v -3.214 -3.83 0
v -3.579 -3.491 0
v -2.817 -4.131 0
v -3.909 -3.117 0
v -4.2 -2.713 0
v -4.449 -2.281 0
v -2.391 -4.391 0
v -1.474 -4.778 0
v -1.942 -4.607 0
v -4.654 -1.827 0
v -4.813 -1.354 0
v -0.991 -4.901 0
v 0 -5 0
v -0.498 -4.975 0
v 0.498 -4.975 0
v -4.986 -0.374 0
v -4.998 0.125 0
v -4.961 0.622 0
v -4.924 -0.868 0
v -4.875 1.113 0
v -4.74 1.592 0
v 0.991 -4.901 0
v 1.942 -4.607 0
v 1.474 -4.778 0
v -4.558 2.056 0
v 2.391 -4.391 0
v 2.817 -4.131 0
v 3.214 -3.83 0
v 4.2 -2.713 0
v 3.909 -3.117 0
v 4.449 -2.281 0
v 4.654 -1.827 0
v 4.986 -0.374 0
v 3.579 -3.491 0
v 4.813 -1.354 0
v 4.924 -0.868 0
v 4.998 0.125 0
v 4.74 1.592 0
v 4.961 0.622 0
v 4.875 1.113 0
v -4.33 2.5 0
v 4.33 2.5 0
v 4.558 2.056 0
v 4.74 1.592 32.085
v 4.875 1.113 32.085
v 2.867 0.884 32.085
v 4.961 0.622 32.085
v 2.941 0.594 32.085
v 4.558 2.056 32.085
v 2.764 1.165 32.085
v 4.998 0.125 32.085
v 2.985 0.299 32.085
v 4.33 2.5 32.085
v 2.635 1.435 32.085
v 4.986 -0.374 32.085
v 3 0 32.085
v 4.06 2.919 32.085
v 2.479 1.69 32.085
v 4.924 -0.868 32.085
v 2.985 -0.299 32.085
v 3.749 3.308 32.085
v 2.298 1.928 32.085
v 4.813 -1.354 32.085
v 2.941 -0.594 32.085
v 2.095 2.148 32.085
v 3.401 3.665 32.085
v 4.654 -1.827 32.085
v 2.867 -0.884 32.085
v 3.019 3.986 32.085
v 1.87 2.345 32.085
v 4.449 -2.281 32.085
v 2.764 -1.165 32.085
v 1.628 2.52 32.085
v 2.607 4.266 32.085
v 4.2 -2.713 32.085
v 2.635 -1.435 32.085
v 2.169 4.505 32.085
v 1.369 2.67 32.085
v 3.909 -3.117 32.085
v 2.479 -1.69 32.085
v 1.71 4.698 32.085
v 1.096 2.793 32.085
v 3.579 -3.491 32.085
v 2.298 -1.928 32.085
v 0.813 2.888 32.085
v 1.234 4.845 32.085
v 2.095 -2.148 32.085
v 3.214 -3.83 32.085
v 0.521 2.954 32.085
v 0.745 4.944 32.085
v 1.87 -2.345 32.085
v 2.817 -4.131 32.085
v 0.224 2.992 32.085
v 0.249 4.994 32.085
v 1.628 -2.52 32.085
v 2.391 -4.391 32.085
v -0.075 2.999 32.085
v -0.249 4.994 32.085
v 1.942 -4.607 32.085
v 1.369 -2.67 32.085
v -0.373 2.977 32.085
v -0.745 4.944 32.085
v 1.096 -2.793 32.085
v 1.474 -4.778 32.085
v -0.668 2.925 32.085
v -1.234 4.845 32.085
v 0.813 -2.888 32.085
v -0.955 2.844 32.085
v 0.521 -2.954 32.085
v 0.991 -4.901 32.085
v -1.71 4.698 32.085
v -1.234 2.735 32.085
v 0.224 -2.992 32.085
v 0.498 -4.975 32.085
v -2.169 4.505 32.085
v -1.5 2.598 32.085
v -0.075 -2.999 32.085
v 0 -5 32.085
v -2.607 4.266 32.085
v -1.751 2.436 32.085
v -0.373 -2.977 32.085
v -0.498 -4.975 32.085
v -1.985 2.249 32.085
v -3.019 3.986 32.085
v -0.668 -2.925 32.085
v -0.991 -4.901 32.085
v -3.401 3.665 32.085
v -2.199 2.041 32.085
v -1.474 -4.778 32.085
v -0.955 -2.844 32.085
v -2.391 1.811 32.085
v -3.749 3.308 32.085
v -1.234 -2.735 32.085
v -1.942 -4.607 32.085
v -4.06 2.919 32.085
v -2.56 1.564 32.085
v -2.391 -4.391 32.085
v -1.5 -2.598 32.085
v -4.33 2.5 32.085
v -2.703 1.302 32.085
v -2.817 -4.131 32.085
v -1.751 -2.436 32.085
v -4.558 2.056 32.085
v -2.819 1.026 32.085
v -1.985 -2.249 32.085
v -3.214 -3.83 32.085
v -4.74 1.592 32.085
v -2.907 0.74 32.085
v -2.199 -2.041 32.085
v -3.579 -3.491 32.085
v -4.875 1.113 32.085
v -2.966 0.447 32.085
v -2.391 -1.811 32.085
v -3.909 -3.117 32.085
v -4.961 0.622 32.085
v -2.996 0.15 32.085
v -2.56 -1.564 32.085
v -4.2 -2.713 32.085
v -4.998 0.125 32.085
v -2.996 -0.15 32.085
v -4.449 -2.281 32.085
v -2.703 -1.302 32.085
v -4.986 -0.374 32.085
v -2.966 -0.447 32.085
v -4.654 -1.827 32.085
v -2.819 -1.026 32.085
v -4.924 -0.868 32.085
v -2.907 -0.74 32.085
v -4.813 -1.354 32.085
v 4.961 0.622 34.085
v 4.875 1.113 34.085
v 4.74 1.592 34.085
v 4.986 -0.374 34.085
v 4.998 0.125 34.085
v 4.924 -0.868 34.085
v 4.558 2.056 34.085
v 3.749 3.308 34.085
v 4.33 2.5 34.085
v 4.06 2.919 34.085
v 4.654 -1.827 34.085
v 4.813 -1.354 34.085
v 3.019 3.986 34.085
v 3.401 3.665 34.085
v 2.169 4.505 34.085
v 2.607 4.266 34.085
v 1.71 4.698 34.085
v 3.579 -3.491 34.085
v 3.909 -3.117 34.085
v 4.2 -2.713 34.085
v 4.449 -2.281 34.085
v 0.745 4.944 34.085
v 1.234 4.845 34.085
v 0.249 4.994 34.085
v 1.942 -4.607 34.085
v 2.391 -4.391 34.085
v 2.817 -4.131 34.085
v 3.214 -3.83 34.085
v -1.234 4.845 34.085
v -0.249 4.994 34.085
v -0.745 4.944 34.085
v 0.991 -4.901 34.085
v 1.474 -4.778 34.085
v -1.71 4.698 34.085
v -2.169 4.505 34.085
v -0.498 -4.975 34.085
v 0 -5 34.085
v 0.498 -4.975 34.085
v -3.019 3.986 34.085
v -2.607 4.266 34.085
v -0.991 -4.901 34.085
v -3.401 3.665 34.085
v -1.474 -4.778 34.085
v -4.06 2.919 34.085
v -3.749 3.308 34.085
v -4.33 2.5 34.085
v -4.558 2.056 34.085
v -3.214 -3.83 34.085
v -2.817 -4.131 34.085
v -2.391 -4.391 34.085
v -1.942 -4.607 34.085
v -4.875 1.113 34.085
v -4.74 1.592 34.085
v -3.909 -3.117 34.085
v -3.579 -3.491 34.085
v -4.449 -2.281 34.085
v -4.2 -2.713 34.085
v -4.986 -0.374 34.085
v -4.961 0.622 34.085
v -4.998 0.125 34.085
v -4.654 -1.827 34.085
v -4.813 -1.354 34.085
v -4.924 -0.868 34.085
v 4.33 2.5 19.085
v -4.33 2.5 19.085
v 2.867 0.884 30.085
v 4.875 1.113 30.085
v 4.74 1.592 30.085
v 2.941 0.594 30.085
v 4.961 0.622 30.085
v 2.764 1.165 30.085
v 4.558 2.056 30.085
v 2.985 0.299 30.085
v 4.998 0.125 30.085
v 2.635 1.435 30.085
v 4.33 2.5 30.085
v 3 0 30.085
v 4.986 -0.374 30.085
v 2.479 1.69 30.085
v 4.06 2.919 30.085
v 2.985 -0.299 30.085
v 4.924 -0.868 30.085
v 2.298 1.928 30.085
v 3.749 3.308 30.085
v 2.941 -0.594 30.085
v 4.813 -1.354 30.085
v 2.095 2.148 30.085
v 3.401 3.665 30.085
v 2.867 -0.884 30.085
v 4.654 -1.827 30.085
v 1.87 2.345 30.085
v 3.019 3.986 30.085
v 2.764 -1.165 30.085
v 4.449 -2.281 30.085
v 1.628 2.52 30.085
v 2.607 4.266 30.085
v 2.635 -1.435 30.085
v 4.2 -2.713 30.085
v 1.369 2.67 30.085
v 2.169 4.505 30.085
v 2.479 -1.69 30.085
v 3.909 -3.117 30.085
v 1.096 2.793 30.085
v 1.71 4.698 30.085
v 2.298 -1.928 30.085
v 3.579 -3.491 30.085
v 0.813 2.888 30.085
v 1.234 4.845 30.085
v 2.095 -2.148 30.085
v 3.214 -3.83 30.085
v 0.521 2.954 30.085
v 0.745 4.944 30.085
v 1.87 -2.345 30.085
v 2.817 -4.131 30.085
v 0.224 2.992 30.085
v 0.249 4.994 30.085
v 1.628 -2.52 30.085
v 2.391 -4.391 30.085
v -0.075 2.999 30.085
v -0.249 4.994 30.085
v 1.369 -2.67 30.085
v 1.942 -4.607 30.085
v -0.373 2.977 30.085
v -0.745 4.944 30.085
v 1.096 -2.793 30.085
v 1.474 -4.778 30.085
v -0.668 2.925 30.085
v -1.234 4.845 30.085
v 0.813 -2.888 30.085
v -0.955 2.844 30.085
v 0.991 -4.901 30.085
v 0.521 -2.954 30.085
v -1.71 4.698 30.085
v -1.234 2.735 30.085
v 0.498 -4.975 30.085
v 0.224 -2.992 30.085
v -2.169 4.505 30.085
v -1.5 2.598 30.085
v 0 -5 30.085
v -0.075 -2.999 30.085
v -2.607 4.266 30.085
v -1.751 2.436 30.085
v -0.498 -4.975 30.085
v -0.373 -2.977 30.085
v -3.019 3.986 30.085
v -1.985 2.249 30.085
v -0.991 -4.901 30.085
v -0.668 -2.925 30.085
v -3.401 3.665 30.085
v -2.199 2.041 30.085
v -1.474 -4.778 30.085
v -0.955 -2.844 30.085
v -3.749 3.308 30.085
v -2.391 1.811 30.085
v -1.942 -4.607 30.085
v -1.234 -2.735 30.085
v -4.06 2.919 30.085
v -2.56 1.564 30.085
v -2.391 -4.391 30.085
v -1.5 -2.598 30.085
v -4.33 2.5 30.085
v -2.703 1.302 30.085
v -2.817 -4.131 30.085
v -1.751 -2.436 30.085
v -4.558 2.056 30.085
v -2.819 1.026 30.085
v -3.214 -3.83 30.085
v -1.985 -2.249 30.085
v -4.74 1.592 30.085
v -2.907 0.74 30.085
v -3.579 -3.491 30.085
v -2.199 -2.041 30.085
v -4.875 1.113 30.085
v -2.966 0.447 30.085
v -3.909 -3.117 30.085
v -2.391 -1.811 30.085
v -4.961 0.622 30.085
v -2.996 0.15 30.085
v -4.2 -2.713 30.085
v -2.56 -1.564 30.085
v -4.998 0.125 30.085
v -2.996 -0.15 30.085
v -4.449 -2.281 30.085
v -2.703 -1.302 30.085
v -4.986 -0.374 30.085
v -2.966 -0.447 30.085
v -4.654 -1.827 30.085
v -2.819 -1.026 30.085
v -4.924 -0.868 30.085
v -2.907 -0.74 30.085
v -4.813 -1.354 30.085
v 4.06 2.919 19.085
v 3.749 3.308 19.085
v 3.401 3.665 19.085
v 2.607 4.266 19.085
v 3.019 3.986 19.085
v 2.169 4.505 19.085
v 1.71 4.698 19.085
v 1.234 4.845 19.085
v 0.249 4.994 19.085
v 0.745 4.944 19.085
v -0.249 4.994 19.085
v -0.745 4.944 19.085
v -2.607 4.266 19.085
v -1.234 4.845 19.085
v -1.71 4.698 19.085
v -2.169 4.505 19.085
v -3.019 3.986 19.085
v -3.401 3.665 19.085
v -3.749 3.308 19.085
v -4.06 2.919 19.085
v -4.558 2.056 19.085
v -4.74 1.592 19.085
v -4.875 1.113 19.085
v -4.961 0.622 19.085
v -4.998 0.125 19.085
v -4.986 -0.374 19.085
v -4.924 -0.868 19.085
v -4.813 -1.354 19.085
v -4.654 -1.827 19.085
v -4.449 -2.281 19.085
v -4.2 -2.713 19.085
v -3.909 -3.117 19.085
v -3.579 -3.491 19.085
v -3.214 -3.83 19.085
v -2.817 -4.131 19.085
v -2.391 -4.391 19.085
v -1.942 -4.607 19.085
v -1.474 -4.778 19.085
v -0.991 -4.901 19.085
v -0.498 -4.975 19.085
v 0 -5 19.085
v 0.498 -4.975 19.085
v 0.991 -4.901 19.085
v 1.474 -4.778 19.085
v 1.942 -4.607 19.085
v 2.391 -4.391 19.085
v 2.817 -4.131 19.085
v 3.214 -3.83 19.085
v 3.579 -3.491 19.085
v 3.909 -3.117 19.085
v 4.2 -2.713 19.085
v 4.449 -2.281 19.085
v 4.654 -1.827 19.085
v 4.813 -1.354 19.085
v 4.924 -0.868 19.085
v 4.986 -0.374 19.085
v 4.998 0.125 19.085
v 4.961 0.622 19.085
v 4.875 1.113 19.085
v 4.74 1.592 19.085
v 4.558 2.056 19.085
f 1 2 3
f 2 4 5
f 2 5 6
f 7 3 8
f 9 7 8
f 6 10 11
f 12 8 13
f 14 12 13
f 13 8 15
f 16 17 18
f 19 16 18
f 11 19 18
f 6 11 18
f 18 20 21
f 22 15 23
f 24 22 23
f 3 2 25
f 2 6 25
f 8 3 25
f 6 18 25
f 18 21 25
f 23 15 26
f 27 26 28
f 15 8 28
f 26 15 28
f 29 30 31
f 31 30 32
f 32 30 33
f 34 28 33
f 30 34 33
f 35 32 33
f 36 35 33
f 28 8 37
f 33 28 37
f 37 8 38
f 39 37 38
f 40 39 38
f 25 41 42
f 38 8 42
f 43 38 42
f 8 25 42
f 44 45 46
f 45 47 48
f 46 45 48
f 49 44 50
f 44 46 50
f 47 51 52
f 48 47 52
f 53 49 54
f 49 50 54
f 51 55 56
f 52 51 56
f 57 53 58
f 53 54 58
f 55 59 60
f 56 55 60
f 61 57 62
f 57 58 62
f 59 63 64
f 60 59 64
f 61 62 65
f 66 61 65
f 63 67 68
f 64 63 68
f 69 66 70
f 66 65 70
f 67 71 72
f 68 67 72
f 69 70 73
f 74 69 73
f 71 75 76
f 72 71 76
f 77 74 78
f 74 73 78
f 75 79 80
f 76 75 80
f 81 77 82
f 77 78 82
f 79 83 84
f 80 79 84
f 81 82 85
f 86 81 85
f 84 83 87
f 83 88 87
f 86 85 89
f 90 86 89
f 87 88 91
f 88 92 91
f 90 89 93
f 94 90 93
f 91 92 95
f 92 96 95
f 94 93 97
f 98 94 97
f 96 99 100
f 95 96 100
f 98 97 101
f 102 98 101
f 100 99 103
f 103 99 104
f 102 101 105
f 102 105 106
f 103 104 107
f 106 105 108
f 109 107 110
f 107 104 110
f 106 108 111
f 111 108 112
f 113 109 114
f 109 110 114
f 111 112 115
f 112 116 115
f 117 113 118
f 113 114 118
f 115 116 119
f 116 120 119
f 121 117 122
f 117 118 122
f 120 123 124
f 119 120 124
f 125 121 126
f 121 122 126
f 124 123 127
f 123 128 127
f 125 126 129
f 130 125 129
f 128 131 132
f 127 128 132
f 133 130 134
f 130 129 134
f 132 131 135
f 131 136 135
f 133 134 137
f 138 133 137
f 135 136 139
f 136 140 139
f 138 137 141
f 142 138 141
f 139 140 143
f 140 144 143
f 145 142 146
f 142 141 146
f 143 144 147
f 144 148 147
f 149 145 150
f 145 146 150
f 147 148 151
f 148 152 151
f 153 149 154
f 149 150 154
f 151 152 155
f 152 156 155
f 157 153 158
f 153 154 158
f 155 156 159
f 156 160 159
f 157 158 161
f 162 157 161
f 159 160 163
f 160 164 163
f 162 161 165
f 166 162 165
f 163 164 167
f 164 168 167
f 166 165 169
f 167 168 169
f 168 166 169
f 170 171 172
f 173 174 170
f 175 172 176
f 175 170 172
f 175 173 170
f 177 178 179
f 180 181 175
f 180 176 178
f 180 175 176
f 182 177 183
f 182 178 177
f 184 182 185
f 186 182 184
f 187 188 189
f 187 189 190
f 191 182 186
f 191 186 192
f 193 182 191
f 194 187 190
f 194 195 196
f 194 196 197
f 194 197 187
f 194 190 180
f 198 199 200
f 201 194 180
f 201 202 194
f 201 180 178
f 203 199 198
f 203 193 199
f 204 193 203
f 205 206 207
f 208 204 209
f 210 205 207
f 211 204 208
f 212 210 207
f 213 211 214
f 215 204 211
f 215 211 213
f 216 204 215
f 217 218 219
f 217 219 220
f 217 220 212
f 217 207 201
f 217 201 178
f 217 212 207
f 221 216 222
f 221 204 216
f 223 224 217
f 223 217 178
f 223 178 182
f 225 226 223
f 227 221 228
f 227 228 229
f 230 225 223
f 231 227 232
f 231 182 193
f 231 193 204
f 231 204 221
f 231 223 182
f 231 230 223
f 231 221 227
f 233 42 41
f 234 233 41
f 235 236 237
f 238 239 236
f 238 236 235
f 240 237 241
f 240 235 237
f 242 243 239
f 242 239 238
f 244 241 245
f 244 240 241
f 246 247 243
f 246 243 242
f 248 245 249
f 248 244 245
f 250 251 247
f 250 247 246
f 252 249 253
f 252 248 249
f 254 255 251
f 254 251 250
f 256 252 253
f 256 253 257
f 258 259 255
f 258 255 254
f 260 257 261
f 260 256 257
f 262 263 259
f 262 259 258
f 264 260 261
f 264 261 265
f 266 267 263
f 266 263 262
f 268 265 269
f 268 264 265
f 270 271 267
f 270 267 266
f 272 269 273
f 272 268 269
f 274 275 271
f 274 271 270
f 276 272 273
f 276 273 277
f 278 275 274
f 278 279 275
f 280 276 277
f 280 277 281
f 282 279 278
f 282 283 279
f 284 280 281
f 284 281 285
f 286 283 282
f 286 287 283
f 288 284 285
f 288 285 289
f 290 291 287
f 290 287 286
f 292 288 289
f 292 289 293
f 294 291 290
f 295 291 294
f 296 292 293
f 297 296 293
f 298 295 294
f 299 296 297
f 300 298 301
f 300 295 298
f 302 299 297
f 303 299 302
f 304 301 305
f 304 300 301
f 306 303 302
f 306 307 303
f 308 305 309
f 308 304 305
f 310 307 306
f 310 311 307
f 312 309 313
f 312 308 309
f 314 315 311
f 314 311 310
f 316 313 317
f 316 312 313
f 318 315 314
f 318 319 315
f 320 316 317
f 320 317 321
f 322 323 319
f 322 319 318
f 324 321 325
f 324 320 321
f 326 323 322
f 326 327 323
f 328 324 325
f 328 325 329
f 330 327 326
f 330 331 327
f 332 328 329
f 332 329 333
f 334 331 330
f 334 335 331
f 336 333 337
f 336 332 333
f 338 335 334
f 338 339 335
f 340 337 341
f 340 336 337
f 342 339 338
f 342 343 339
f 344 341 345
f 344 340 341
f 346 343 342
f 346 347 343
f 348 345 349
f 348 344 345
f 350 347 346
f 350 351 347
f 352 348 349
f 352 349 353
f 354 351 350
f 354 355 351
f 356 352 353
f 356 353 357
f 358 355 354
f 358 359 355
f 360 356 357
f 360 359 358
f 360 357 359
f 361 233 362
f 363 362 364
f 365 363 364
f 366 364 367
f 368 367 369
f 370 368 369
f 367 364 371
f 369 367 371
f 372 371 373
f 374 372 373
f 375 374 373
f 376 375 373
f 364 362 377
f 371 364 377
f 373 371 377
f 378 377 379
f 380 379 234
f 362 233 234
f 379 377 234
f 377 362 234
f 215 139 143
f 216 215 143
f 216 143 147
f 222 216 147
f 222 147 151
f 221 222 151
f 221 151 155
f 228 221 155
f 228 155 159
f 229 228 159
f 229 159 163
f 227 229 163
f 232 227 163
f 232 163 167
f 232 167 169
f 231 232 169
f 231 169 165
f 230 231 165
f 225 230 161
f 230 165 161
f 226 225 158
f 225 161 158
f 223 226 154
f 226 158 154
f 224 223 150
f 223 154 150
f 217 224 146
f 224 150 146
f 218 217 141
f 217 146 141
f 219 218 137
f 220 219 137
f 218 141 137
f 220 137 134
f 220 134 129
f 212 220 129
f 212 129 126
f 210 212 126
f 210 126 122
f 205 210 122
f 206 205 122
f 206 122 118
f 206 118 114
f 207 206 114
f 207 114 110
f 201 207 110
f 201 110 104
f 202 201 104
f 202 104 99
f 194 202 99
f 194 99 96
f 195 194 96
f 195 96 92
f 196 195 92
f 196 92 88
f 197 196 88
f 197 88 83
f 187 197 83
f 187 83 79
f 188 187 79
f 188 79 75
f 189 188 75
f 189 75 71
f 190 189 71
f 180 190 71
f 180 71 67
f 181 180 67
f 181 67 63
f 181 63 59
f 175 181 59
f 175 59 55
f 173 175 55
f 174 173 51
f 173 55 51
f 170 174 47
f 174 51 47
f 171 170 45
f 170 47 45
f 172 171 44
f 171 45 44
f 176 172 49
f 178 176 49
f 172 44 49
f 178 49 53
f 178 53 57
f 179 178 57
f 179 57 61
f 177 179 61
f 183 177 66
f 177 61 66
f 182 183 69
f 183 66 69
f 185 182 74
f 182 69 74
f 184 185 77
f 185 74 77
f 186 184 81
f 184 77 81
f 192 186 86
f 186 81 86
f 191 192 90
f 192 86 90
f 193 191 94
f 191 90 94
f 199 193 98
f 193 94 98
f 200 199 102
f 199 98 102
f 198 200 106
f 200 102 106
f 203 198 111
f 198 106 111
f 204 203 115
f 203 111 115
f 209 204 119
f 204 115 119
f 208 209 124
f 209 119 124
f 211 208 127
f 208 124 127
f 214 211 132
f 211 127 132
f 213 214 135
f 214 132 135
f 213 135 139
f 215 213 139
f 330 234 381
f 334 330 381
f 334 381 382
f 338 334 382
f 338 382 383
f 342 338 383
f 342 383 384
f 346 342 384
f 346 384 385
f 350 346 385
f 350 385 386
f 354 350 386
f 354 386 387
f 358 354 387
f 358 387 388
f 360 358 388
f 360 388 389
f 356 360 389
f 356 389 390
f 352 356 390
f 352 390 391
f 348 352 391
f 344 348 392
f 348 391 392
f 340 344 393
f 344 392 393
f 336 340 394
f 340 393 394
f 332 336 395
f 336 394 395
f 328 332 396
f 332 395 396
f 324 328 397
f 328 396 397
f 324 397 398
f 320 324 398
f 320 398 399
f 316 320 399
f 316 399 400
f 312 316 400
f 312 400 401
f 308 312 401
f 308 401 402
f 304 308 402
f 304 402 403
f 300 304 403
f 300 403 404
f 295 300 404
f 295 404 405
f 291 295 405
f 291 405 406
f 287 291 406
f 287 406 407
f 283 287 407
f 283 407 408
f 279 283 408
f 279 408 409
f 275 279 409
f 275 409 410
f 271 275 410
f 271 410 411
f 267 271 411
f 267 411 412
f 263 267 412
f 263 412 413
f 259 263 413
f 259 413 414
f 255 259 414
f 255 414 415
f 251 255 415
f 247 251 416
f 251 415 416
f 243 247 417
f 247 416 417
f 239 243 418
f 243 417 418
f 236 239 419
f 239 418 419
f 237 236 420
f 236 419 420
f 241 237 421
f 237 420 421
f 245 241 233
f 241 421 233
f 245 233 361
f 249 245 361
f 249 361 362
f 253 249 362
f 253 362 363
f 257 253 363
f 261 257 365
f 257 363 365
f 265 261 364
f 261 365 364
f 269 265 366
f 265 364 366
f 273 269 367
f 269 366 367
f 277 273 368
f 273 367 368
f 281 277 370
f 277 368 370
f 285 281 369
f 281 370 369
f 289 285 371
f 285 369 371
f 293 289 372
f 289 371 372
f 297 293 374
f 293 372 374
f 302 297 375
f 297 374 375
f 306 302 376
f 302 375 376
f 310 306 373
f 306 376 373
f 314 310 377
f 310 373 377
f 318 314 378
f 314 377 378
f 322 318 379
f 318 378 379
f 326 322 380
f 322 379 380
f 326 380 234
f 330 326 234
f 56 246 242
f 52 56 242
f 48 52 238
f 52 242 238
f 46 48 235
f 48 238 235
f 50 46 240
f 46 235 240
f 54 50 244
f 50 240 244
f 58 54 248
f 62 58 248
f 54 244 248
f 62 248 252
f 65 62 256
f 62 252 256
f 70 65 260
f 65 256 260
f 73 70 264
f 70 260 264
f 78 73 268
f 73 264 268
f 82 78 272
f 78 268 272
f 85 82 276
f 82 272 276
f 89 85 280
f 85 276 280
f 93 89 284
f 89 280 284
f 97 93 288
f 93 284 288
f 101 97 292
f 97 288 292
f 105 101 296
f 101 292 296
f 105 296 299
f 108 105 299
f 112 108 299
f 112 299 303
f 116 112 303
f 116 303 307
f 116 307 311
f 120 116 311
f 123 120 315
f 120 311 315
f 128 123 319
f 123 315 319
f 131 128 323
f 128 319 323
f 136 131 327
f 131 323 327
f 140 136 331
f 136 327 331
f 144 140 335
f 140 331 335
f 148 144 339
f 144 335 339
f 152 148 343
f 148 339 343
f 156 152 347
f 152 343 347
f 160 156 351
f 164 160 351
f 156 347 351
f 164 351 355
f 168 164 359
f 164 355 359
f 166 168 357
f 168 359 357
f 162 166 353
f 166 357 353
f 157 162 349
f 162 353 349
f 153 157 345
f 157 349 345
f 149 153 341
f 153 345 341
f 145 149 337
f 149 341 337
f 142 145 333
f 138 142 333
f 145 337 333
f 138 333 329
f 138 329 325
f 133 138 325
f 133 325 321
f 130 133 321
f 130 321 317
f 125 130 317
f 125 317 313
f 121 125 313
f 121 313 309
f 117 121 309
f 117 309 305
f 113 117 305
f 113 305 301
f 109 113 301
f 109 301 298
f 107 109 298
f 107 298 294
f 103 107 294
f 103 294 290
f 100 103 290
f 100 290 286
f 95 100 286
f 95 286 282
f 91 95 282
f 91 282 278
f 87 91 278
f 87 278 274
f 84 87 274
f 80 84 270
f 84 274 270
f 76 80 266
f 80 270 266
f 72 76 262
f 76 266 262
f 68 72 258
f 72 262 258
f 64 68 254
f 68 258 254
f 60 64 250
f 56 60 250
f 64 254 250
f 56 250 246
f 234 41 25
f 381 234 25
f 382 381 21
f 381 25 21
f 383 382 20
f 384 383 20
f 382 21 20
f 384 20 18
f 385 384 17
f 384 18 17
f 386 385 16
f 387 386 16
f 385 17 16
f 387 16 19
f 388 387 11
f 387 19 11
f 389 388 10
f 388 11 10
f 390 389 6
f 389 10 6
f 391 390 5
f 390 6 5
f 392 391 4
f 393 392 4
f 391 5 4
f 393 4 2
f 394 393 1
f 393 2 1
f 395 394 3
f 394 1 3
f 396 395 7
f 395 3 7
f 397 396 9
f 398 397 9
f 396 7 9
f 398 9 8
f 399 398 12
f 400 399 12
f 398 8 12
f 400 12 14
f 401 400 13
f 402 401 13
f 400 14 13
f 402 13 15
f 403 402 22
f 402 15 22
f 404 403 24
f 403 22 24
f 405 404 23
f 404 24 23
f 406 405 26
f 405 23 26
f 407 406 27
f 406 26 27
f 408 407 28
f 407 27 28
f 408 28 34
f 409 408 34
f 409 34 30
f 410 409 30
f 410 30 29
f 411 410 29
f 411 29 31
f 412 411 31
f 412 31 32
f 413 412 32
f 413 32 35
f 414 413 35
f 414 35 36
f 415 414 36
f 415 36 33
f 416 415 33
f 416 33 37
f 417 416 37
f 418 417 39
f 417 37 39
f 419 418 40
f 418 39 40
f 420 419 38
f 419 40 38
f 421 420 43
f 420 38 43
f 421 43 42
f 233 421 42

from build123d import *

# Parameters (mm, degrees)
BOSS_EXTRUDE1_DEPTH = 19.0848469
SKETCH2_R           = 5
BOSS_EXTRUDE2_DEPTH = 15
CUT_EXTRUDE1_START  = -2
SKETCH3_R           = 5
SKETCH3_R_2         = 3
CUT_EXTRUDE1_DEPTH  = 2


with BuildPart() as part:
    # Sketch1 → Boss-Extrude1 (new body)
    with BuildSketch(Plane.XY):
        with BuildLine():
            Line((0, 2.5), (-4.330127019, 2.5))
            ThreePointArc((-4.330127019, 2.5), (0, -5), (4.330127019, 2.5))
            Line((4.330127019, 2.5), (0, 2.5))
        make_face()
    extrude(amount=BOSS_EXTRUDE1_DEPTH)

    # Sketch2 → Boss-Extrude2 (add)
    with BuildSketch(Plane.XY.offset(19.0848469)):
        with Locations(Location((0, 0, 0), (0, 0, 150))):
            Circle(SKETCH2_R)
    extrude(amount=BOSS_EXTRUDE2_DEPTH)

    # Sketch3 → Cut-Extrude1 (cut)
    with BuildSketch(Plane.XY.offset(32.0848469).offset(CUT_EXTRUDE1_START)):
        with Locations(Location((0, 0, 0), (0, 0, 150))):
            Circle(SKETCH3_R)
        Circle(SKETCH3_R_2, mode=Mode.SUBTRACT)
    extrude(amount=CUT_EXTRUDE1_DEPTH, mode=Mode.SUBTRACT)


solid = part.part
